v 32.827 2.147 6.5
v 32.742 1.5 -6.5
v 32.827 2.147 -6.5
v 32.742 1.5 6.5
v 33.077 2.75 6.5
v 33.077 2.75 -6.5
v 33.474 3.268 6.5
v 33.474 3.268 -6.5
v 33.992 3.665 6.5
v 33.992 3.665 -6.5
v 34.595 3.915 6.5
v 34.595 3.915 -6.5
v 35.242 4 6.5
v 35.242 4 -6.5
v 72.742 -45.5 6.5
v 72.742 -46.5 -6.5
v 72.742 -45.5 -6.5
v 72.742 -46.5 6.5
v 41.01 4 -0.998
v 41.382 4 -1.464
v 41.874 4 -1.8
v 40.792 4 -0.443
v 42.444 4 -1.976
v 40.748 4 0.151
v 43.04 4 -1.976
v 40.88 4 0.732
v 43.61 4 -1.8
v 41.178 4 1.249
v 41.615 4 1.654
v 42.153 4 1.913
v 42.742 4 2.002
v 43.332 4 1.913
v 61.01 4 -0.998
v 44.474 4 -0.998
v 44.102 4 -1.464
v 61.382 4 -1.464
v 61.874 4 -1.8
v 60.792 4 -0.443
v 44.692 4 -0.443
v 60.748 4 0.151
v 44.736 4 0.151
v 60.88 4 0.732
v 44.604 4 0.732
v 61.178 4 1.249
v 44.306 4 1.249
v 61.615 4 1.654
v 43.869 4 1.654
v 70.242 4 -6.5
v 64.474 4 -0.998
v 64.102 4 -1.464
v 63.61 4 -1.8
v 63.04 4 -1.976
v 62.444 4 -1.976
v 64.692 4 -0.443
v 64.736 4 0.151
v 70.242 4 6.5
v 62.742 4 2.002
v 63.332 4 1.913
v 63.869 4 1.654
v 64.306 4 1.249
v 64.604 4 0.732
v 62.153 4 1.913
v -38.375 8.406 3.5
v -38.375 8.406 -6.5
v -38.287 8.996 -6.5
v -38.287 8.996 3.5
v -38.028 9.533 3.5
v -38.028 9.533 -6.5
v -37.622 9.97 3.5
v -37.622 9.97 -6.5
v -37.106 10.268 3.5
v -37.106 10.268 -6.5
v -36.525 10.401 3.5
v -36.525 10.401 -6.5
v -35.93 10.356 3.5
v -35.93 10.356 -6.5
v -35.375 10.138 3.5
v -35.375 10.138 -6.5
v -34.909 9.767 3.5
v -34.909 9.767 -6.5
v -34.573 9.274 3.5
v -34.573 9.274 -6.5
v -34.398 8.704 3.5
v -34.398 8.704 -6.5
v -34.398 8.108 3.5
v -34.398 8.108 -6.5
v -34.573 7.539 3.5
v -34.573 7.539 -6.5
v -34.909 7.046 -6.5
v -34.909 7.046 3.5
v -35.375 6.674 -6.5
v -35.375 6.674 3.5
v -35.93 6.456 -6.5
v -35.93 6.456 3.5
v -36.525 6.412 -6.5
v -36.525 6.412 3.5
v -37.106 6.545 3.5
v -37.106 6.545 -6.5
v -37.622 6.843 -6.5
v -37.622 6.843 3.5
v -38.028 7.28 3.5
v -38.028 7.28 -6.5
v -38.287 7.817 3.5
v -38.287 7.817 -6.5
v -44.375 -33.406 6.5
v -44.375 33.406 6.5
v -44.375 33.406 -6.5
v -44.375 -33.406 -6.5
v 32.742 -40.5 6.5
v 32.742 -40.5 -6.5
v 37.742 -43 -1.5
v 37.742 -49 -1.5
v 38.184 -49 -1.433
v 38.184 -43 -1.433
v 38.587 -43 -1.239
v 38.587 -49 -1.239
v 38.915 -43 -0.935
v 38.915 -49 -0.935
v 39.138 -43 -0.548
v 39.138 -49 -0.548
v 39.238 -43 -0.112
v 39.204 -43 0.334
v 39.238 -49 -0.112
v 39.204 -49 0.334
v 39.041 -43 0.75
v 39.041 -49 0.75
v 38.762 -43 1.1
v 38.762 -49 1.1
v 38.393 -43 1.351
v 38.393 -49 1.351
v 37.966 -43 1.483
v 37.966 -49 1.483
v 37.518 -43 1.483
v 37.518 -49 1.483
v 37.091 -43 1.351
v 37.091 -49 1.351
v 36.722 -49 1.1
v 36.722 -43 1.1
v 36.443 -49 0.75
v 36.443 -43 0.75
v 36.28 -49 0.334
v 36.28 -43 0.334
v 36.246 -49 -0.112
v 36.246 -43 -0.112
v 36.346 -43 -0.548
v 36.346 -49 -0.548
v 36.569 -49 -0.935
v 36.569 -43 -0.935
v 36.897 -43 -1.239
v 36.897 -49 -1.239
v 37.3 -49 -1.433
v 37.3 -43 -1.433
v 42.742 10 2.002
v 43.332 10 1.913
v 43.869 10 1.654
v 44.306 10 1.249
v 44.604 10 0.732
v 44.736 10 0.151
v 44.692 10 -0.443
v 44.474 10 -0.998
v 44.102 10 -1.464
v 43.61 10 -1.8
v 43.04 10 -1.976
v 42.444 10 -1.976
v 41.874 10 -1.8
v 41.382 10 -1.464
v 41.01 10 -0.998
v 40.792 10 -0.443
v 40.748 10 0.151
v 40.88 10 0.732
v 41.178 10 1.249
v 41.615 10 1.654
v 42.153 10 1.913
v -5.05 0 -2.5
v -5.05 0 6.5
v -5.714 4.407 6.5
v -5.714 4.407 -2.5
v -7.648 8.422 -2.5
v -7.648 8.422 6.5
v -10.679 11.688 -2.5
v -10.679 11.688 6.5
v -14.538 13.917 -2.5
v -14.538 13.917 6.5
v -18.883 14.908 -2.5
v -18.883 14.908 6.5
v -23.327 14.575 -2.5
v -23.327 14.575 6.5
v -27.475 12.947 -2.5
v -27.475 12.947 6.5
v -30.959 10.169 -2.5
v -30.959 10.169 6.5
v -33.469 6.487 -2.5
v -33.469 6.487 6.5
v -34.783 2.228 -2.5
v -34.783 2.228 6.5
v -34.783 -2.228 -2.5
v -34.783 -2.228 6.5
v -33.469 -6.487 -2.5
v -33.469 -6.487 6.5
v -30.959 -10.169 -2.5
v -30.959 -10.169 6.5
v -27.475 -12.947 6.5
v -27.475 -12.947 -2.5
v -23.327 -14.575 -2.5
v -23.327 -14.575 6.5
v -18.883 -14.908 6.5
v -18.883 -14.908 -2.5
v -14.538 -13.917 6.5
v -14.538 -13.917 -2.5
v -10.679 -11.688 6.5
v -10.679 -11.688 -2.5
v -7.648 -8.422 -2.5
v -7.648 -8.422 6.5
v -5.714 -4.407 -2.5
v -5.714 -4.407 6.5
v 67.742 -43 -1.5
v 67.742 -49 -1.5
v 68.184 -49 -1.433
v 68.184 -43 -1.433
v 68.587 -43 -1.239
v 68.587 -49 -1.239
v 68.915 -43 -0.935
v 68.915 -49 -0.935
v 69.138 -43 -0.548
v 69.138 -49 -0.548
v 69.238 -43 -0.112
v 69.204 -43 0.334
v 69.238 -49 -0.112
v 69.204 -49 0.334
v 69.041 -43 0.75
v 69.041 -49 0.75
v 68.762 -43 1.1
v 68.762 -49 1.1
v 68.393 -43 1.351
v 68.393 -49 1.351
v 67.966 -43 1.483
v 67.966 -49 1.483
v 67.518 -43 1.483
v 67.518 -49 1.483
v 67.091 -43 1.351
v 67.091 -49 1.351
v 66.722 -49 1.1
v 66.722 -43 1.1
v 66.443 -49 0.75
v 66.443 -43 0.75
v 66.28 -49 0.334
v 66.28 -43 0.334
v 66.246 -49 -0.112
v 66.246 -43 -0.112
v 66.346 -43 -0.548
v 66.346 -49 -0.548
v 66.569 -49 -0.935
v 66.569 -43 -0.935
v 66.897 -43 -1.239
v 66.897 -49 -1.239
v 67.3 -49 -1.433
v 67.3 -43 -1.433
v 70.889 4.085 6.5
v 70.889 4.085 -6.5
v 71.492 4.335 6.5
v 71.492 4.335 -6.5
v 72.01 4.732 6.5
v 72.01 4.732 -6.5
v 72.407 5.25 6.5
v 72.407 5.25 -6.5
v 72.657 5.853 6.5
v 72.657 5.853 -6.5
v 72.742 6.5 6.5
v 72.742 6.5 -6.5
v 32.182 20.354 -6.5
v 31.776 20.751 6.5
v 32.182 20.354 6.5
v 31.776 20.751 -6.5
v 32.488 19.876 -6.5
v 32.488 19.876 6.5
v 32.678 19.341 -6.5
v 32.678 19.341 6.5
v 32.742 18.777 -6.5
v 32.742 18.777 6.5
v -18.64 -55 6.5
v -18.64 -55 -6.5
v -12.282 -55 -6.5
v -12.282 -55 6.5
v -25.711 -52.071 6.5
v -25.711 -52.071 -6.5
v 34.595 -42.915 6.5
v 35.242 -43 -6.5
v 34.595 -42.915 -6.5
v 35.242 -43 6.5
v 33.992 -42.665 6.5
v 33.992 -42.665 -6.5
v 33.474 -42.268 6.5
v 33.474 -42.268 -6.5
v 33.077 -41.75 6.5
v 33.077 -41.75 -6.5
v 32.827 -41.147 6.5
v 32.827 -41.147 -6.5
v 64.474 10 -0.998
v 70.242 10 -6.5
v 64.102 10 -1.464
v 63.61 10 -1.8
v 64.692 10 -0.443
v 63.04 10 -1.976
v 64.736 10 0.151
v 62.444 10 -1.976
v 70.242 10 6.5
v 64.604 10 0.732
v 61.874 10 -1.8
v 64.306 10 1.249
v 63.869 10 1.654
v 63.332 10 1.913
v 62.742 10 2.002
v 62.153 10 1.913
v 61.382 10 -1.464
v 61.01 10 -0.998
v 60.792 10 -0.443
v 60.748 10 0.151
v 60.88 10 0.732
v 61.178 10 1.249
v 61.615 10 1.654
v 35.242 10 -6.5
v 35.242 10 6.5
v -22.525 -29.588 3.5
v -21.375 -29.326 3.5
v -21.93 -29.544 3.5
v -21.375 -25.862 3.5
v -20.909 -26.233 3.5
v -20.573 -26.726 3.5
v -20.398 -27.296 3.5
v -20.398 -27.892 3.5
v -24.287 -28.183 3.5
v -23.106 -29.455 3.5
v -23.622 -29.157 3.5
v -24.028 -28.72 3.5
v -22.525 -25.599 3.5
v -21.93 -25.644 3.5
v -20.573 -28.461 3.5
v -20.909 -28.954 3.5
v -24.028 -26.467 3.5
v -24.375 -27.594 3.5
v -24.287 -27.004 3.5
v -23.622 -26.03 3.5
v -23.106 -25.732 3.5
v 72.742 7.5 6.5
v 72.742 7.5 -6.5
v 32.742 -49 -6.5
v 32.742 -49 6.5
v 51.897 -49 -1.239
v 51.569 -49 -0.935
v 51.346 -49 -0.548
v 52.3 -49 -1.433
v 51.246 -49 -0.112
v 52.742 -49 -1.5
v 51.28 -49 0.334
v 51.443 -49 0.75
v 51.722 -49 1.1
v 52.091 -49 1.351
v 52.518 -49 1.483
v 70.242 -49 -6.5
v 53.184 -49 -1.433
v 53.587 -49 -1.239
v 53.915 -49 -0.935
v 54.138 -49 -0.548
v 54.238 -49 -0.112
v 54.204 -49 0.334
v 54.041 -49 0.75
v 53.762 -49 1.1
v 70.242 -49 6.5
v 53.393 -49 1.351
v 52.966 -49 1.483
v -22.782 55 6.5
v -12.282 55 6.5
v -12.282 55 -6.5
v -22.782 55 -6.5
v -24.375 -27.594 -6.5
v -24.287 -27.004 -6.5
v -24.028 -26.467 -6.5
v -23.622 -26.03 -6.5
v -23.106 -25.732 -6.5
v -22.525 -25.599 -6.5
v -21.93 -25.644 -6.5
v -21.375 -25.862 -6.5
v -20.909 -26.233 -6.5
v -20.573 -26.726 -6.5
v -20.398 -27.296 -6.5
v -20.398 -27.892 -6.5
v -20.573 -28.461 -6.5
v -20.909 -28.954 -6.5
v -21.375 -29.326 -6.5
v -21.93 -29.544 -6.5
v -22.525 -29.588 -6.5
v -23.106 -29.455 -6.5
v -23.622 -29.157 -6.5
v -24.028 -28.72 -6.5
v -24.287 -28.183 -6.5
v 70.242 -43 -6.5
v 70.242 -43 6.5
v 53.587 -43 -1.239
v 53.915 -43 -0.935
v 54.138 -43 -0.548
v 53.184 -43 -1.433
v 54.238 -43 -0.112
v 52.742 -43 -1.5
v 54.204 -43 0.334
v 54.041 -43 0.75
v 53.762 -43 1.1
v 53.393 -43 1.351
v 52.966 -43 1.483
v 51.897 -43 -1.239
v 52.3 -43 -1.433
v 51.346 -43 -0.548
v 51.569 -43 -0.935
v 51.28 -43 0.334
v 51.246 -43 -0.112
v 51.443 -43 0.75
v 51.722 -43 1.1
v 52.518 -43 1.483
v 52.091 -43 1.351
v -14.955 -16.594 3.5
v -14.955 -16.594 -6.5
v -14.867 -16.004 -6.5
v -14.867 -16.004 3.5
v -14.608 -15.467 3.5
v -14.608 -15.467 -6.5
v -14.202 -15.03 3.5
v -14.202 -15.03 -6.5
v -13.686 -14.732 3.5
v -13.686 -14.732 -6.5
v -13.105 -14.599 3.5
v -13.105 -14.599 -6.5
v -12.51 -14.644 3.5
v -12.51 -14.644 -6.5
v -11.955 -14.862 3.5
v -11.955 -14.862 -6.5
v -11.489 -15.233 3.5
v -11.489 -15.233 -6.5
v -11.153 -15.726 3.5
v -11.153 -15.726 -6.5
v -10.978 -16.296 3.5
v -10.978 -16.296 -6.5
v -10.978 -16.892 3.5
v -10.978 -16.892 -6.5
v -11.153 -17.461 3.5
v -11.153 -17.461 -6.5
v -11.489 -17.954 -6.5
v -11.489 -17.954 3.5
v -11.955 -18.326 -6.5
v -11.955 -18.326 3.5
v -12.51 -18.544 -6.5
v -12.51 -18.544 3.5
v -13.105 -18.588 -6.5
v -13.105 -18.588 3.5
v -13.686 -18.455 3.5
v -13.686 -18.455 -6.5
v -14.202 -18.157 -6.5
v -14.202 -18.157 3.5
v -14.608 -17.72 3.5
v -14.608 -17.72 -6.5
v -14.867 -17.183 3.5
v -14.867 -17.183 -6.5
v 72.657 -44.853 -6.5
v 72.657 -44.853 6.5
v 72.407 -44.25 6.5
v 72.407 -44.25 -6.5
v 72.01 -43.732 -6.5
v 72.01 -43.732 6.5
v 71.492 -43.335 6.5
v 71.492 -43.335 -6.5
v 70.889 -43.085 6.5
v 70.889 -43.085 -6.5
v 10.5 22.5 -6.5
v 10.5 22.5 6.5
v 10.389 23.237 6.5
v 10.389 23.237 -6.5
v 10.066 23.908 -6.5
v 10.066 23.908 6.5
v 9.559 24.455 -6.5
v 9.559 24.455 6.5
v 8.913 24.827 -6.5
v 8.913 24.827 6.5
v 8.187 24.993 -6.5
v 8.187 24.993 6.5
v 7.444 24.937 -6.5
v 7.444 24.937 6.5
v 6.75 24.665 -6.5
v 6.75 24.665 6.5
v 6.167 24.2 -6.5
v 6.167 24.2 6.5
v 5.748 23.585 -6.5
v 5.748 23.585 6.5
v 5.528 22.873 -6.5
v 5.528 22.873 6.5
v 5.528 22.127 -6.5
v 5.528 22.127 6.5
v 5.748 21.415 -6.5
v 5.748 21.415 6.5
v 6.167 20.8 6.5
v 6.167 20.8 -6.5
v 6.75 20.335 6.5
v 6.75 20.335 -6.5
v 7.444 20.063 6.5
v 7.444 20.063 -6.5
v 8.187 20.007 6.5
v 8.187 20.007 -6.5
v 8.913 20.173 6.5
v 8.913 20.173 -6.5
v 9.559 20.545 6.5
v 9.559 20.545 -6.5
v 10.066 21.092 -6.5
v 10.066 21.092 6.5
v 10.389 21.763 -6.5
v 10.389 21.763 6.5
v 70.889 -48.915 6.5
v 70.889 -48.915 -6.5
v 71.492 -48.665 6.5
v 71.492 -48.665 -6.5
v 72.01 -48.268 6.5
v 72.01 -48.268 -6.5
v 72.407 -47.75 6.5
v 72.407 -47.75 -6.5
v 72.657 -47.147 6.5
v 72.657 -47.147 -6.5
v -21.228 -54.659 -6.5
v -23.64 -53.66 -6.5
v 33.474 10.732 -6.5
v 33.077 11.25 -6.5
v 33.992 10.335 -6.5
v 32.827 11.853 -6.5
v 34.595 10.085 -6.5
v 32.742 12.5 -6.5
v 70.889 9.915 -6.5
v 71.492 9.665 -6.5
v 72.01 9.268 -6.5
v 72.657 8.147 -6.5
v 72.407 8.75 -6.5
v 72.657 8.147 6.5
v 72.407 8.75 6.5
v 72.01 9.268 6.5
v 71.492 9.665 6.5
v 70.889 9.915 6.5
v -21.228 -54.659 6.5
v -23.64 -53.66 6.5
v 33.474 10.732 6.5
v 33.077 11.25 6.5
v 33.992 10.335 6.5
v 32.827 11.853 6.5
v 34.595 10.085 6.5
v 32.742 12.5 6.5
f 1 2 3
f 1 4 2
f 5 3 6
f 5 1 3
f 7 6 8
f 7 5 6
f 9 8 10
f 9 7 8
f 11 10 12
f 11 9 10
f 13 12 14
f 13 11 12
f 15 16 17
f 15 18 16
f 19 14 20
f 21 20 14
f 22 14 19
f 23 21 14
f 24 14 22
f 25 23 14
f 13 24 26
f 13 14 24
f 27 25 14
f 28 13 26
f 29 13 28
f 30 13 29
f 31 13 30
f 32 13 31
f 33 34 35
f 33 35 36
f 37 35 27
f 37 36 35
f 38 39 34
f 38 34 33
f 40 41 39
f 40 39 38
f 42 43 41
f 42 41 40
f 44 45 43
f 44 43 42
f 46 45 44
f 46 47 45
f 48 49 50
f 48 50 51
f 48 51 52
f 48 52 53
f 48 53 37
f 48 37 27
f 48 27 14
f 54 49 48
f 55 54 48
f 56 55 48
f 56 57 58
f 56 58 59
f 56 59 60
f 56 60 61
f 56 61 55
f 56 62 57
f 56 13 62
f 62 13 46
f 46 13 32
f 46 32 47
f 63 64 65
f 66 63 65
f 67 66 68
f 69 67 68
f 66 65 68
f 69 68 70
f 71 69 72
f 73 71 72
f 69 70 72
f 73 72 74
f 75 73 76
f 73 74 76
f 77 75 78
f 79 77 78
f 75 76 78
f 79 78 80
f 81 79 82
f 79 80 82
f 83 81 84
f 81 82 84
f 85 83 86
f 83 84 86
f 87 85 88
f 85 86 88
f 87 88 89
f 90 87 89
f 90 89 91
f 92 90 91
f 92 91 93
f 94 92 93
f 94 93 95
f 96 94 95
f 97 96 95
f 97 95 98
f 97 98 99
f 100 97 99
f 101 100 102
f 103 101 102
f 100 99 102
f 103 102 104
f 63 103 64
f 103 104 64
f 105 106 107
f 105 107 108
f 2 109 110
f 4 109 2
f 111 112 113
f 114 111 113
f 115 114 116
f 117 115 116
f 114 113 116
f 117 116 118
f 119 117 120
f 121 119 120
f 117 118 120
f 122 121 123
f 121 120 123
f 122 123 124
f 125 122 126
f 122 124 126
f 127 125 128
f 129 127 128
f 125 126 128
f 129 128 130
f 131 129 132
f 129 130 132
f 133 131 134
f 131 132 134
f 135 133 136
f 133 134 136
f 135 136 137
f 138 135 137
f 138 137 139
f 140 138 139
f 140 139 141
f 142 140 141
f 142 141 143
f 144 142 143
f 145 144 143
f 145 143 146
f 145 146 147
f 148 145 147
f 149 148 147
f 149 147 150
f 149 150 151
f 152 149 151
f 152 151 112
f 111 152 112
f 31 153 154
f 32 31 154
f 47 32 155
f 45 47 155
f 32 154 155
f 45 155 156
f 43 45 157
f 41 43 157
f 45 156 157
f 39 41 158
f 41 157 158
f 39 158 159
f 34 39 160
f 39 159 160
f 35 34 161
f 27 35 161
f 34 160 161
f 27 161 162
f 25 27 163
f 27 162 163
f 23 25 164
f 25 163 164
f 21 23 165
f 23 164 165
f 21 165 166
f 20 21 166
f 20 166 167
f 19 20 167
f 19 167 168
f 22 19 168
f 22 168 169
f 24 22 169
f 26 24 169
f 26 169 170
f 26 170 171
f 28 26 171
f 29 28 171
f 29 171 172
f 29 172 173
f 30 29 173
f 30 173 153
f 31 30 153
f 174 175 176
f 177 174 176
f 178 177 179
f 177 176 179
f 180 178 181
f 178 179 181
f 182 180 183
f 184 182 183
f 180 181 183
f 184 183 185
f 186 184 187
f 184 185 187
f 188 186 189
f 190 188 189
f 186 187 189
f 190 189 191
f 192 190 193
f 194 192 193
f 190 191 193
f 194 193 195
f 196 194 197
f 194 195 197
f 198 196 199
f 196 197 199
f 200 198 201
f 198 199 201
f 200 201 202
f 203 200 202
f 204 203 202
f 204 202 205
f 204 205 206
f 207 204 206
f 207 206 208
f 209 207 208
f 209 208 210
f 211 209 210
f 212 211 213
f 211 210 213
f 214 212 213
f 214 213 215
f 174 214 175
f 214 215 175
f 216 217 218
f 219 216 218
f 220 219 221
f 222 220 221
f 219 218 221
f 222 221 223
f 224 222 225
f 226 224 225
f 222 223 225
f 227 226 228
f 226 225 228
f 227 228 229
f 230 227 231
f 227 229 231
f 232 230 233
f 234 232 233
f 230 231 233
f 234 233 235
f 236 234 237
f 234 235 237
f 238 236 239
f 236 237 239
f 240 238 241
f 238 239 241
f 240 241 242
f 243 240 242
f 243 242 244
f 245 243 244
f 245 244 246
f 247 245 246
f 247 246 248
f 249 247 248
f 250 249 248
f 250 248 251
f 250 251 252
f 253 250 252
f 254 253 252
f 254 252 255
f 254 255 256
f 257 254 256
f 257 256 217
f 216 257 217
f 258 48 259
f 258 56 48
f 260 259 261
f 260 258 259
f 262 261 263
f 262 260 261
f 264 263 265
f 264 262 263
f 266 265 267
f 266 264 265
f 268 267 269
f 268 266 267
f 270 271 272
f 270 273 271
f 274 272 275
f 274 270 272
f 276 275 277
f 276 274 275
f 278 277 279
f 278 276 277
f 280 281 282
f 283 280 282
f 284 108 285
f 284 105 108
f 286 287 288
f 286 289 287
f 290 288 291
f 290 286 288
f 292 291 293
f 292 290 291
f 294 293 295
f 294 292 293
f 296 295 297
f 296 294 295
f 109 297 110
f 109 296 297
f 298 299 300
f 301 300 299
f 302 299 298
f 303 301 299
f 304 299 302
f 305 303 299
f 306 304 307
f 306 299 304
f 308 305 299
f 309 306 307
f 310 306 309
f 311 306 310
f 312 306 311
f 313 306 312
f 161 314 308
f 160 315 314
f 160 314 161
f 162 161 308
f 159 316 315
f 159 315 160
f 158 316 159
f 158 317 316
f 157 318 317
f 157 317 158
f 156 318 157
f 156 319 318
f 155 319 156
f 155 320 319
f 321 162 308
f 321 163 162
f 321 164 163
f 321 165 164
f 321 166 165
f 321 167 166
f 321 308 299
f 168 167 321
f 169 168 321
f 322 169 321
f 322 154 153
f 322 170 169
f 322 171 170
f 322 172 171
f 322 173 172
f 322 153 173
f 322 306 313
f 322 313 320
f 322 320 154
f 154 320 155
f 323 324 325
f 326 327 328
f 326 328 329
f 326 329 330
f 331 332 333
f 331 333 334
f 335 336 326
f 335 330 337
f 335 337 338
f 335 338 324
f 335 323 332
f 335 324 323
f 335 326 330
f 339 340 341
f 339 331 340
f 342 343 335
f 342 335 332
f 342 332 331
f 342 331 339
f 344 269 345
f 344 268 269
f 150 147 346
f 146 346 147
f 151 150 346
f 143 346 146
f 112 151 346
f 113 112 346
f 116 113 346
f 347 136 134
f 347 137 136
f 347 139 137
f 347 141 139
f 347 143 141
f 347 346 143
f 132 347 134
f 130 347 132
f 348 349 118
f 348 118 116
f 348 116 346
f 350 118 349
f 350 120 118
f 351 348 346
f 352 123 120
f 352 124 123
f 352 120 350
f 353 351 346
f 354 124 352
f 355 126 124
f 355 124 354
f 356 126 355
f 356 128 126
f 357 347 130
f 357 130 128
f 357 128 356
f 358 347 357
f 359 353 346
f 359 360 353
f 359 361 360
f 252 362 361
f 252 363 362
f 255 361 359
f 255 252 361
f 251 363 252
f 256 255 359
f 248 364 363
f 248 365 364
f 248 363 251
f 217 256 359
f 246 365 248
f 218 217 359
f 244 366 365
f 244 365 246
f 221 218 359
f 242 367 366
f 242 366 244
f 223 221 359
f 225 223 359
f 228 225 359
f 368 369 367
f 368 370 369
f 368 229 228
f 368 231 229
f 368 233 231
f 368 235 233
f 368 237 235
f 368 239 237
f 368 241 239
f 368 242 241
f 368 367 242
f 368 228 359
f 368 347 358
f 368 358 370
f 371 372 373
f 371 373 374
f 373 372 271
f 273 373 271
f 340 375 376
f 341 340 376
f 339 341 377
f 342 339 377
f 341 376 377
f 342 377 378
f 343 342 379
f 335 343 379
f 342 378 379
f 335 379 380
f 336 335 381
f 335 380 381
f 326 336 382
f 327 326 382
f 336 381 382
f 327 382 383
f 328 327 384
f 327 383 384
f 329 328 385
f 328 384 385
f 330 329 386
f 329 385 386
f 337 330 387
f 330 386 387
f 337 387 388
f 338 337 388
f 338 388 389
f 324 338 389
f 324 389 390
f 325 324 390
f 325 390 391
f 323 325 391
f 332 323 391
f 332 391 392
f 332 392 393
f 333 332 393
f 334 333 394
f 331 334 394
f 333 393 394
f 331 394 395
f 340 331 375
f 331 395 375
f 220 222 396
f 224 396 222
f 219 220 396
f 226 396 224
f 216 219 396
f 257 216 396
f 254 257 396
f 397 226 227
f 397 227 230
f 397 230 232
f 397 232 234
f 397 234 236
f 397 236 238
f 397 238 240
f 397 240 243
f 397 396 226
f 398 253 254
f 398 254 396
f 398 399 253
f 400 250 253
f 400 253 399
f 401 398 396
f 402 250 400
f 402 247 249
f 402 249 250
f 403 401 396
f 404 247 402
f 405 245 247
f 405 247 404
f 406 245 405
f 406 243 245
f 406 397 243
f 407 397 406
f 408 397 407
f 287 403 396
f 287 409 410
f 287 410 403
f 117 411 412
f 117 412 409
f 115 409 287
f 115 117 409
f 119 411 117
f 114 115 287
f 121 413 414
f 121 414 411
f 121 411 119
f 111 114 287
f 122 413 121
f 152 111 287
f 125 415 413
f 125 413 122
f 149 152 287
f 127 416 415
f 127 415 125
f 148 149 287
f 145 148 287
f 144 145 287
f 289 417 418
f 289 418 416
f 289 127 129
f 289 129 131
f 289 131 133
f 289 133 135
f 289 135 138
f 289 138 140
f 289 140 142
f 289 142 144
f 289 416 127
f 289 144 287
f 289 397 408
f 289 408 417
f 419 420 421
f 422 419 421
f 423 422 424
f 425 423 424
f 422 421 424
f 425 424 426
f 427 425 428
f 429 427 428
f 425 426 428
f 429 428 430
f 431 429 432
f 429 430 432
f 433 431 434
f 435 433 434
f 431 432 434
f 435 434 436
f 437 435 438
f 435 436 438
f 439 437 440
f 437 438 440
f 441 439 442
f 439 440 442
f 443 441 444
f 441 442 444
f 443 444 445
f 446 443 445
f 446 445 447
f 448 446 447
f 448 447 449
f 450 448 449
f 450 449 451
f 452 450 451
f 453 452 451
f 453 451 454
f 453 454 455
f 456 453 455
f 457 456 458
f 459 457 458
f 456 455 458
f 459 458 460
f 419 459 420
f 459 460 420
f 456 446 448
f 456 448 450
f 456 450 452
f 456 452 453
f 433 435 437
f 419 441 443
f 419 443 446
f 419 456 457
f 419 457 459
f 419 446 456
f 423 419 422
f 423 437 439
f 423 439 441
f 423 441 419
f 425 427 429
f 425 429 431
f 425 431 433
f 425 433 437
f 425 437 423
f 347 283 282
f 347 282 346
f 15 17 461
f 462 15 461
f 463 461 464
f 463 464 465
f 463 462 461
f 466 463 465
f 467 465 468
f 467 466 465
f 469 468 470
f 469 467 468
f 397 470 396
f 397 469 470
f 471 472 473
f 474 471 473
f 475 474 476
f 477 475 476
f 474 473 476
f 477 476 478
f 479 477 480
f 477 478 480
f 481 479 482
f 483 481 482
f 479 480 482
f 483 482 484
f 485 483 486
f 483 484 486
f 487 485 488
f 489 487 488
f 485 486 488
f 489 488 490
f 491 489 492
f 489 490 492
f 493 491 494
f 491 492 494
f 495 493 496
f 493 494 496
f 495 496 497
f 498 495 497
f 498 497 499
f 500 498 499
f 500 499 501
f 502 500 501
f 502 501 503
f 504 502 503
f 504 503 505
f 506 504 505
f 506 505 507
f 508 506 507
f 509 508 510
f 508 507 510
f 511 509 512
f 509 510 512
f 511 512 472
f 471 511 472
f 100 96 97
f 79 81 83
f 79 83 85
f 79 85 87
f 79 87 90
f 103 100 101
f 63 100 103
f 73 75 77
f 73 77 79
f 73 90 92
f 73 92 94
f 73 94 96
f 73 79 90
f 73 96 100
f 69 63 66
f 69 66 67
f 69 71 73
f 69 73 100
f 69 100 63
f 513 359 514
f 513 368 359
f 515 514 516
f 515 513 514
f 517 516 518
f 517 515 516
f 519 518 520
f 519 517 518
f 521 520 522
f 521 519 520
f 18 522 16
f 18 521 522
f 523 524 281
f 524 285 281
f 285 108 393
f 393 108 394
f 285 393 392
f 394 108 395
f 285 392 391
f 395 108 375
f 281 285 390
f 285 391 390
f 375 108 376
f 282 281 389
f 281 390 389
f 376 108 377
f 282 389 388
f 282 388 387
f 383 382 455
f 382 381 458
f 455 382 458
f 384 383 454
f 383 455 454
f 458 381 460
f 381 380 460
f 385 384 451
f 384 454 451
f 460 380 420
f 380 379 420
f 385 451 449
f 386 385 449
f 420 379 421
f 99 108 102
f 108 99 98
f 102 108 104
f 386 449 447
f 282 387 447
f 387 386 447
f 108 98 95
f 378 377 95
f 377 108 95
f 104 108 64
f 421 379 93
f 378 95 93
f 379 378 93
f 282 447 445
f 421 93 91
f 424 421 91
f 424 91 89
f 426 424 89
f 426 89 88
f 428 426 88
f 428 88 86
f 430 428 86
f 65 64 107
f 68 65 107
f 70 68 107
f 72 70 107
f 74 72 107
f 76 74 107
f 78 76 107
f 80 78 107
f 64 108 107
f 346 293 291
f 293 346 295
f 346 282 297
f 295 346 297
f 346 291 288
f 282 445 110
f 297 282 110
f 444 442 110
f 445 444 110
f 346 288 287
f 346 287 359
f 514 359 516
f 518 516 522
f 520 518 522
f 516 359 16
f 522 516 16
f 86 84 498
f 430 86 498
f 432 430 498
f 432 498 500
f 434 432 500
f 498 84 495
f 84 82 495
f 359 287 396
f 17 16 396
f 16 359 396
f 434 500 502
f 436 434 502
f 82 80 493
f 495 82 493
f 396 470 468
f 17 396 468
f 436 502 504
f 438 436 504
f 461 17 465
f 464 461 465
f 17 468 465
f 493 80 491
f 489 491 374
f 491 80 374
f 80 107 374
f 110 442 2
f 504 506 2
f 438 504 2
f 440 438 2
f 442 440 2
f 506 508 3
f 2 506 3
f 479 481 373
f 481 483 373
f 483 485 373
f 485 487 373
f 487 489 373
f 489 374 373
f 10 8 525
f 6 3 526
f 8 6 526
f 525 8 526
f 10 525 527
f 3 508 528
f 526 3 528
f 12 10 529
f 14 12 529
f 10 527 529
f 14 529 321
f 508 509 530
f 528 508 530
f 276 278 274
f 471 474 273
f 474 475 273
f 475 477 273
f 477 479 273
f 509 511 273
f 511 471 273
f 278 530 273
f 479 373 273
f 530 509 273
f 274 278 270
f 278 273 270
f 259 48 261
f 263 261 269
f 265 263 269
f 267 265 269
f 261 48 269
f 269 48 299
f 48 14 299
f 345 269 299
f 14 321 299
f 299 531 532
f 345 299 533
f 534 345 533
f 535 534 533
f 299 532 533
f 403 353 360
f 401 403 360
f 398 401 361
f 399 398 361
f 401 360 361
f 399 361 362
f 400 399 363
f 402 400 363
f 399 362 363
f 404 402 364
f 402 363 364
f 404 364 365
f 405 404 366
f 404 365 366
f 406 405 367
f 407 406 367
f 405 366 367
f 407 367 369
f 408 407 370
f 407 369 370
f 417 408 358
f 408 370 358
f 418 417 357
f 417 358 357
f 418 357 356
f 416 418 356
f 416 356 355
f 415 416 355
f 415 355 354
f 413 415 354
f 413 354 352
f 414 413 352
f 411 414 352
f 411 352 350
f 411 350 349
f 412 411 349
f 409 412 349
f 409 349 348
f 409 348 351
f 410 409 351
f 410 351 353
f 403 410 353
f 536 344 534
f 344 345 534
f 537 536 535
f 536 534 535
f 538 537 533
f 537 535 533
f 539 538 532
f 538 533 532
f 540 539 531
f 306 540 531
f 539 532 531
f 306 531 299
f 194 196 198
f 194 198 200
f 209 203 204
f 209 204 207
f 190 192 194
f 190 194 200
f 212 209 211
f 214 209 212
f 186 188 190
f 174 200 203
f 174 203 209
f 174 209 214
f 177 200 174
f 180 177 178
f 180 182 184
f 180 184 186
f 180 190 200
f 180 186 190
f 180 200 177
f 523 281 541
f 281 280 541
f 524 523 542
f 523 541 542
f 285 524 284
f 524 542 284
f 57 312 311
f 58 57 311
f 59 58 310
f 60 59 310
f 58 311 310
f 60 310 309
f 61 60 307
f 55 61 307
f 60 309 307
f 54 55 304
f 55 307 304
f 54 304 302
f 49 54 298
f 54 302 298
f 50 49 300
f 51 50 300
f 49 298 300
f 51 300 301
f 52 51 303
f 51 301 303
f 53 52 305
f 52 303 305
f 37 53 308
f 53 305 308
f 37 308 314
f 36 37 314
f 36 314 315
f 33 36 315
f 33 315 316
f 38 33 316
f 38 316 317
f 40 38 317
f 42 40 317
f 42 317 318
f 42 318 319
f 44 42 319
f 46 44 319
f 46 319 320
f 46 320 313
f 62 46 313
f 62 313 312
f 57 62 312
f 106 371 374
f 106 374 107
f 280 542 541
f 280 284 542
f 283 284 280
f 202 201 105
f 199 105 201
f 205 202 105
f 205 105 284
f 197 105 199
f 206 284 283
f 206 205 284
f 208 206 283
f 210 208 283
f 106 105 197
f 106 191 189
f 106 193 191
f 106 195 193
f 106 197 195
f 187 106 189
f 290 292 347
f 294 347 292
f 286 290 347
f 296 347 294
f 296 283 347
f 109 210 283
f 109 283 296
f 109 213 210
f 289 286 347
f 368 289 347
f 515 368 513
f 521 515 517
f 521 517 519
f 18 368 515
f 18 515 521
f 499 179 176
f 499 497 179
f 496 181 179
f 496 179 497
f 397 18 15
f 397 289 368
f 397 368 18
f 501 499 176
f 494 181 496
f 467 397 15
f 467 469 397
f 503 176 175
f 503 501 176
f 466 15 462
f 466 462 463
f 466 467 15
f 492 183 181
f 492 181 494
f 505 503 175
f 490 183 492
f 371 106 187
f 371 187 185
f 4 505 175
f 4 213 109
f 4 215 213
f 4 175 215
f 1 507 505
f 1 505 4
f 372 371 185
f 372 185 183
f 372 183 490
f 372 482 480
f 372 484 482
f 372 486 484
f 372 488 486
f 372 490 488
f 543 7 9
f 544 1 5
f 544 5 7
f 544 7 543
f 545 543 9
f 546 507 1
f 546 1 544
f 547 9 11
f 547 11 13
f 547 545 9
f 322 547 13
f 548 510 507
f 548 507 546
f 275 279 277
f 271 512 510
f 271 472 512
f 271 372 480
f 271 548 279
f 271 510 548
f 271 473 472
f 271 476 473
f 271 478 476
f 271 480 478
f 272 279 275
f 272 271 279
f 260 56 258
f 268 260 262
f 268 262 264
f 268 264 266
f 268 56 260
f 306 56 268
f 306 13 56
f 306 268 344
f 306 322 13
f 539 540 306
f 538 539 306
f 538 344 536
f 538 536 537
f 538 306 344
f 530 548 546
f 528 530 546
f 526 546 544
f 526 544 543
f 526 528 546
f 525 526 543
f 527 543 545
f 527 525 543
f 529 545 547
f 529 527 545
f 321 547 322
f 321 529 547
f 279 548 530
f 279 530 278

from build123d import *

# Parameters (mm, degrees)
RESSALTO_EXTRUS_O1_DEPTH = 6.5
ESBO_O2_R                = 14.95
CORTE_EXTRUS_O1_DEPTH    = 9
ESBO_O3_R                = 2.5
CORTE_EXTRUS_O2_DEPTH    = 13
FILETE1_R                = 10
ESBO_O4_R                = 2
CORTE_EXTRUS_O3_DEPTH    = 10
ESBO_O6_R                = 2
CORTE_EXTRUS_O4_DEPTH    = 10
ESBO_O7_R                = 1.5
CORTE_EXTRUS_O5_DEPTH    = 10
FILETE2_R                = 2.5


with BuildPart() as part:
    # Esboço1 → Ressalto-extrusão1 (new, symmetric)
    with BuildSketch(Plane.XY):
        Polygon((32.742040246, 55), (-22.781745931, 55), (-44.375431078, 33.406314852), (-44.375431078, -33.406314852), (-22.781745931, -55), (32.742040246, -55), (32.742040246, -49), (72.742040246, -49), (72.742040246, -43), (32.742040246, -43), (32.742040246, 4), (72.742040246, 4), (72.742040246, 10), (32.742040246, 10), align=None)
    extrude(amount=RESSALTO_EXTRUS_O1_DEPTH, both=True)

    # Esboço2 → Corte-extrusão1 (cut)
    with BuildSketch(Plane.XY.offset(6.5)):
        with Locations((-20, 0)):
            Circle(ESBO_O2_R)
    extrude(amount=-CORTE_EXTRUS_O1_DEPTH, mode=Mode.SUBTRACT)

    # Esboço3 → Corte-extrusão2 (cut)
    with BuildSketch(Plane.XY.offset(6.5)):
        with Locations((8, 22.5)):
            Circle(ESBO_O3_R)
        Polygon((-12.281745931, -55), (32.742040246, -49), (32.742040246, -55), align=None)
        Polygon((32.742040246, 55), (-12.281745931, 55), (32.742040246, 20), align=None)
    extrude(amount=-CORTE_EXTRUS_O2_DEPTH, mode=Mode.SUBTRACT)

    # Filete1
    filete1_edges = [part.edges().sort_by_distance(p)[0] for p in [
        (-22.781745931, -55, 0),
    ]]
    fillet(filete1_edges, radius=FILETE1_R)

    # Esboço4 → Corte-extrusão3 (cut)
    with BuildSketch(Plane(origin=(0, 0, -6.5), x_dir=(-1, 0, 0), z_dir=(0, 0, -1))):
        with Locations((36.375431078, 8.406314852)):
            Circle(ESBO_O4_R)
        with Locations((12.955431078, -16.593685148)):
            Circle(ESBO_O4_R)
        with Locations((22.375431078, -27.593685148)):
            Circle(ESBO_O4_R)
    extrude(amount=-CORTE_EXTRUS_O3_DEPTH, mode=Mode.SUBTRACT)

    # Esboço6 → Corte-extrusão4 (cut)
    with BuildSketch(Plane(origin=(0, 10, 0), x_dir=(1, 0, 0), z_dir=(0, 1, 0))):
        with Locations(Location((42.742040246, -0.001621735, 0), (0, 0, 270))):
            Circle(ESBO_O6_R)
        with Locations(Location((62.742040246, -0.001621735, 0), (0, 0, 270))):
            Circle(ESBO_O6_R)
    extrude(amount=-CORTE_EXTRUS_O4_DEPTH, mode=Mode.SUBTRACT)

    # Esboço7 → Corte-extrusão5 (cut)
    with BuildSketch(Plane.XZ.offset(49)):
        with Locations(Location((37.742040246, 0, 0), (0, 0, 270))):
            Circle(ESBO_O7_R)
        with Locations(Location((52.742040246, 0, 0), (0, 0, 270))):
            Circle(ESBO_O7_R)
        with Locations(Location((67.742040246, 0, 0), (0, 0, 270))):
            Circle(ESBO_O7_R)
    extrude(amount=-CORTE_EXTRUS_O5_DEPTH, mode=Mode.SUBTRACT)

    # Filete2
    filete2_edges = [part.edges().sort_by_distance(p)[0] for p in [
        (32.742040246, 10, 0),
        (72.742040246, 10, 0),
        (72.742040246, 4, 0),
        (32.742040246, 4, 0),
        (32.742040246, -43, 0),
        (72.742040246, -43, 0),
        (72.742040246, -49, 0),
        (32.742040246, 20, 0),
    ]]
    fillet(filete2_edges, radius=FILETE2_R)


solid = part.part
